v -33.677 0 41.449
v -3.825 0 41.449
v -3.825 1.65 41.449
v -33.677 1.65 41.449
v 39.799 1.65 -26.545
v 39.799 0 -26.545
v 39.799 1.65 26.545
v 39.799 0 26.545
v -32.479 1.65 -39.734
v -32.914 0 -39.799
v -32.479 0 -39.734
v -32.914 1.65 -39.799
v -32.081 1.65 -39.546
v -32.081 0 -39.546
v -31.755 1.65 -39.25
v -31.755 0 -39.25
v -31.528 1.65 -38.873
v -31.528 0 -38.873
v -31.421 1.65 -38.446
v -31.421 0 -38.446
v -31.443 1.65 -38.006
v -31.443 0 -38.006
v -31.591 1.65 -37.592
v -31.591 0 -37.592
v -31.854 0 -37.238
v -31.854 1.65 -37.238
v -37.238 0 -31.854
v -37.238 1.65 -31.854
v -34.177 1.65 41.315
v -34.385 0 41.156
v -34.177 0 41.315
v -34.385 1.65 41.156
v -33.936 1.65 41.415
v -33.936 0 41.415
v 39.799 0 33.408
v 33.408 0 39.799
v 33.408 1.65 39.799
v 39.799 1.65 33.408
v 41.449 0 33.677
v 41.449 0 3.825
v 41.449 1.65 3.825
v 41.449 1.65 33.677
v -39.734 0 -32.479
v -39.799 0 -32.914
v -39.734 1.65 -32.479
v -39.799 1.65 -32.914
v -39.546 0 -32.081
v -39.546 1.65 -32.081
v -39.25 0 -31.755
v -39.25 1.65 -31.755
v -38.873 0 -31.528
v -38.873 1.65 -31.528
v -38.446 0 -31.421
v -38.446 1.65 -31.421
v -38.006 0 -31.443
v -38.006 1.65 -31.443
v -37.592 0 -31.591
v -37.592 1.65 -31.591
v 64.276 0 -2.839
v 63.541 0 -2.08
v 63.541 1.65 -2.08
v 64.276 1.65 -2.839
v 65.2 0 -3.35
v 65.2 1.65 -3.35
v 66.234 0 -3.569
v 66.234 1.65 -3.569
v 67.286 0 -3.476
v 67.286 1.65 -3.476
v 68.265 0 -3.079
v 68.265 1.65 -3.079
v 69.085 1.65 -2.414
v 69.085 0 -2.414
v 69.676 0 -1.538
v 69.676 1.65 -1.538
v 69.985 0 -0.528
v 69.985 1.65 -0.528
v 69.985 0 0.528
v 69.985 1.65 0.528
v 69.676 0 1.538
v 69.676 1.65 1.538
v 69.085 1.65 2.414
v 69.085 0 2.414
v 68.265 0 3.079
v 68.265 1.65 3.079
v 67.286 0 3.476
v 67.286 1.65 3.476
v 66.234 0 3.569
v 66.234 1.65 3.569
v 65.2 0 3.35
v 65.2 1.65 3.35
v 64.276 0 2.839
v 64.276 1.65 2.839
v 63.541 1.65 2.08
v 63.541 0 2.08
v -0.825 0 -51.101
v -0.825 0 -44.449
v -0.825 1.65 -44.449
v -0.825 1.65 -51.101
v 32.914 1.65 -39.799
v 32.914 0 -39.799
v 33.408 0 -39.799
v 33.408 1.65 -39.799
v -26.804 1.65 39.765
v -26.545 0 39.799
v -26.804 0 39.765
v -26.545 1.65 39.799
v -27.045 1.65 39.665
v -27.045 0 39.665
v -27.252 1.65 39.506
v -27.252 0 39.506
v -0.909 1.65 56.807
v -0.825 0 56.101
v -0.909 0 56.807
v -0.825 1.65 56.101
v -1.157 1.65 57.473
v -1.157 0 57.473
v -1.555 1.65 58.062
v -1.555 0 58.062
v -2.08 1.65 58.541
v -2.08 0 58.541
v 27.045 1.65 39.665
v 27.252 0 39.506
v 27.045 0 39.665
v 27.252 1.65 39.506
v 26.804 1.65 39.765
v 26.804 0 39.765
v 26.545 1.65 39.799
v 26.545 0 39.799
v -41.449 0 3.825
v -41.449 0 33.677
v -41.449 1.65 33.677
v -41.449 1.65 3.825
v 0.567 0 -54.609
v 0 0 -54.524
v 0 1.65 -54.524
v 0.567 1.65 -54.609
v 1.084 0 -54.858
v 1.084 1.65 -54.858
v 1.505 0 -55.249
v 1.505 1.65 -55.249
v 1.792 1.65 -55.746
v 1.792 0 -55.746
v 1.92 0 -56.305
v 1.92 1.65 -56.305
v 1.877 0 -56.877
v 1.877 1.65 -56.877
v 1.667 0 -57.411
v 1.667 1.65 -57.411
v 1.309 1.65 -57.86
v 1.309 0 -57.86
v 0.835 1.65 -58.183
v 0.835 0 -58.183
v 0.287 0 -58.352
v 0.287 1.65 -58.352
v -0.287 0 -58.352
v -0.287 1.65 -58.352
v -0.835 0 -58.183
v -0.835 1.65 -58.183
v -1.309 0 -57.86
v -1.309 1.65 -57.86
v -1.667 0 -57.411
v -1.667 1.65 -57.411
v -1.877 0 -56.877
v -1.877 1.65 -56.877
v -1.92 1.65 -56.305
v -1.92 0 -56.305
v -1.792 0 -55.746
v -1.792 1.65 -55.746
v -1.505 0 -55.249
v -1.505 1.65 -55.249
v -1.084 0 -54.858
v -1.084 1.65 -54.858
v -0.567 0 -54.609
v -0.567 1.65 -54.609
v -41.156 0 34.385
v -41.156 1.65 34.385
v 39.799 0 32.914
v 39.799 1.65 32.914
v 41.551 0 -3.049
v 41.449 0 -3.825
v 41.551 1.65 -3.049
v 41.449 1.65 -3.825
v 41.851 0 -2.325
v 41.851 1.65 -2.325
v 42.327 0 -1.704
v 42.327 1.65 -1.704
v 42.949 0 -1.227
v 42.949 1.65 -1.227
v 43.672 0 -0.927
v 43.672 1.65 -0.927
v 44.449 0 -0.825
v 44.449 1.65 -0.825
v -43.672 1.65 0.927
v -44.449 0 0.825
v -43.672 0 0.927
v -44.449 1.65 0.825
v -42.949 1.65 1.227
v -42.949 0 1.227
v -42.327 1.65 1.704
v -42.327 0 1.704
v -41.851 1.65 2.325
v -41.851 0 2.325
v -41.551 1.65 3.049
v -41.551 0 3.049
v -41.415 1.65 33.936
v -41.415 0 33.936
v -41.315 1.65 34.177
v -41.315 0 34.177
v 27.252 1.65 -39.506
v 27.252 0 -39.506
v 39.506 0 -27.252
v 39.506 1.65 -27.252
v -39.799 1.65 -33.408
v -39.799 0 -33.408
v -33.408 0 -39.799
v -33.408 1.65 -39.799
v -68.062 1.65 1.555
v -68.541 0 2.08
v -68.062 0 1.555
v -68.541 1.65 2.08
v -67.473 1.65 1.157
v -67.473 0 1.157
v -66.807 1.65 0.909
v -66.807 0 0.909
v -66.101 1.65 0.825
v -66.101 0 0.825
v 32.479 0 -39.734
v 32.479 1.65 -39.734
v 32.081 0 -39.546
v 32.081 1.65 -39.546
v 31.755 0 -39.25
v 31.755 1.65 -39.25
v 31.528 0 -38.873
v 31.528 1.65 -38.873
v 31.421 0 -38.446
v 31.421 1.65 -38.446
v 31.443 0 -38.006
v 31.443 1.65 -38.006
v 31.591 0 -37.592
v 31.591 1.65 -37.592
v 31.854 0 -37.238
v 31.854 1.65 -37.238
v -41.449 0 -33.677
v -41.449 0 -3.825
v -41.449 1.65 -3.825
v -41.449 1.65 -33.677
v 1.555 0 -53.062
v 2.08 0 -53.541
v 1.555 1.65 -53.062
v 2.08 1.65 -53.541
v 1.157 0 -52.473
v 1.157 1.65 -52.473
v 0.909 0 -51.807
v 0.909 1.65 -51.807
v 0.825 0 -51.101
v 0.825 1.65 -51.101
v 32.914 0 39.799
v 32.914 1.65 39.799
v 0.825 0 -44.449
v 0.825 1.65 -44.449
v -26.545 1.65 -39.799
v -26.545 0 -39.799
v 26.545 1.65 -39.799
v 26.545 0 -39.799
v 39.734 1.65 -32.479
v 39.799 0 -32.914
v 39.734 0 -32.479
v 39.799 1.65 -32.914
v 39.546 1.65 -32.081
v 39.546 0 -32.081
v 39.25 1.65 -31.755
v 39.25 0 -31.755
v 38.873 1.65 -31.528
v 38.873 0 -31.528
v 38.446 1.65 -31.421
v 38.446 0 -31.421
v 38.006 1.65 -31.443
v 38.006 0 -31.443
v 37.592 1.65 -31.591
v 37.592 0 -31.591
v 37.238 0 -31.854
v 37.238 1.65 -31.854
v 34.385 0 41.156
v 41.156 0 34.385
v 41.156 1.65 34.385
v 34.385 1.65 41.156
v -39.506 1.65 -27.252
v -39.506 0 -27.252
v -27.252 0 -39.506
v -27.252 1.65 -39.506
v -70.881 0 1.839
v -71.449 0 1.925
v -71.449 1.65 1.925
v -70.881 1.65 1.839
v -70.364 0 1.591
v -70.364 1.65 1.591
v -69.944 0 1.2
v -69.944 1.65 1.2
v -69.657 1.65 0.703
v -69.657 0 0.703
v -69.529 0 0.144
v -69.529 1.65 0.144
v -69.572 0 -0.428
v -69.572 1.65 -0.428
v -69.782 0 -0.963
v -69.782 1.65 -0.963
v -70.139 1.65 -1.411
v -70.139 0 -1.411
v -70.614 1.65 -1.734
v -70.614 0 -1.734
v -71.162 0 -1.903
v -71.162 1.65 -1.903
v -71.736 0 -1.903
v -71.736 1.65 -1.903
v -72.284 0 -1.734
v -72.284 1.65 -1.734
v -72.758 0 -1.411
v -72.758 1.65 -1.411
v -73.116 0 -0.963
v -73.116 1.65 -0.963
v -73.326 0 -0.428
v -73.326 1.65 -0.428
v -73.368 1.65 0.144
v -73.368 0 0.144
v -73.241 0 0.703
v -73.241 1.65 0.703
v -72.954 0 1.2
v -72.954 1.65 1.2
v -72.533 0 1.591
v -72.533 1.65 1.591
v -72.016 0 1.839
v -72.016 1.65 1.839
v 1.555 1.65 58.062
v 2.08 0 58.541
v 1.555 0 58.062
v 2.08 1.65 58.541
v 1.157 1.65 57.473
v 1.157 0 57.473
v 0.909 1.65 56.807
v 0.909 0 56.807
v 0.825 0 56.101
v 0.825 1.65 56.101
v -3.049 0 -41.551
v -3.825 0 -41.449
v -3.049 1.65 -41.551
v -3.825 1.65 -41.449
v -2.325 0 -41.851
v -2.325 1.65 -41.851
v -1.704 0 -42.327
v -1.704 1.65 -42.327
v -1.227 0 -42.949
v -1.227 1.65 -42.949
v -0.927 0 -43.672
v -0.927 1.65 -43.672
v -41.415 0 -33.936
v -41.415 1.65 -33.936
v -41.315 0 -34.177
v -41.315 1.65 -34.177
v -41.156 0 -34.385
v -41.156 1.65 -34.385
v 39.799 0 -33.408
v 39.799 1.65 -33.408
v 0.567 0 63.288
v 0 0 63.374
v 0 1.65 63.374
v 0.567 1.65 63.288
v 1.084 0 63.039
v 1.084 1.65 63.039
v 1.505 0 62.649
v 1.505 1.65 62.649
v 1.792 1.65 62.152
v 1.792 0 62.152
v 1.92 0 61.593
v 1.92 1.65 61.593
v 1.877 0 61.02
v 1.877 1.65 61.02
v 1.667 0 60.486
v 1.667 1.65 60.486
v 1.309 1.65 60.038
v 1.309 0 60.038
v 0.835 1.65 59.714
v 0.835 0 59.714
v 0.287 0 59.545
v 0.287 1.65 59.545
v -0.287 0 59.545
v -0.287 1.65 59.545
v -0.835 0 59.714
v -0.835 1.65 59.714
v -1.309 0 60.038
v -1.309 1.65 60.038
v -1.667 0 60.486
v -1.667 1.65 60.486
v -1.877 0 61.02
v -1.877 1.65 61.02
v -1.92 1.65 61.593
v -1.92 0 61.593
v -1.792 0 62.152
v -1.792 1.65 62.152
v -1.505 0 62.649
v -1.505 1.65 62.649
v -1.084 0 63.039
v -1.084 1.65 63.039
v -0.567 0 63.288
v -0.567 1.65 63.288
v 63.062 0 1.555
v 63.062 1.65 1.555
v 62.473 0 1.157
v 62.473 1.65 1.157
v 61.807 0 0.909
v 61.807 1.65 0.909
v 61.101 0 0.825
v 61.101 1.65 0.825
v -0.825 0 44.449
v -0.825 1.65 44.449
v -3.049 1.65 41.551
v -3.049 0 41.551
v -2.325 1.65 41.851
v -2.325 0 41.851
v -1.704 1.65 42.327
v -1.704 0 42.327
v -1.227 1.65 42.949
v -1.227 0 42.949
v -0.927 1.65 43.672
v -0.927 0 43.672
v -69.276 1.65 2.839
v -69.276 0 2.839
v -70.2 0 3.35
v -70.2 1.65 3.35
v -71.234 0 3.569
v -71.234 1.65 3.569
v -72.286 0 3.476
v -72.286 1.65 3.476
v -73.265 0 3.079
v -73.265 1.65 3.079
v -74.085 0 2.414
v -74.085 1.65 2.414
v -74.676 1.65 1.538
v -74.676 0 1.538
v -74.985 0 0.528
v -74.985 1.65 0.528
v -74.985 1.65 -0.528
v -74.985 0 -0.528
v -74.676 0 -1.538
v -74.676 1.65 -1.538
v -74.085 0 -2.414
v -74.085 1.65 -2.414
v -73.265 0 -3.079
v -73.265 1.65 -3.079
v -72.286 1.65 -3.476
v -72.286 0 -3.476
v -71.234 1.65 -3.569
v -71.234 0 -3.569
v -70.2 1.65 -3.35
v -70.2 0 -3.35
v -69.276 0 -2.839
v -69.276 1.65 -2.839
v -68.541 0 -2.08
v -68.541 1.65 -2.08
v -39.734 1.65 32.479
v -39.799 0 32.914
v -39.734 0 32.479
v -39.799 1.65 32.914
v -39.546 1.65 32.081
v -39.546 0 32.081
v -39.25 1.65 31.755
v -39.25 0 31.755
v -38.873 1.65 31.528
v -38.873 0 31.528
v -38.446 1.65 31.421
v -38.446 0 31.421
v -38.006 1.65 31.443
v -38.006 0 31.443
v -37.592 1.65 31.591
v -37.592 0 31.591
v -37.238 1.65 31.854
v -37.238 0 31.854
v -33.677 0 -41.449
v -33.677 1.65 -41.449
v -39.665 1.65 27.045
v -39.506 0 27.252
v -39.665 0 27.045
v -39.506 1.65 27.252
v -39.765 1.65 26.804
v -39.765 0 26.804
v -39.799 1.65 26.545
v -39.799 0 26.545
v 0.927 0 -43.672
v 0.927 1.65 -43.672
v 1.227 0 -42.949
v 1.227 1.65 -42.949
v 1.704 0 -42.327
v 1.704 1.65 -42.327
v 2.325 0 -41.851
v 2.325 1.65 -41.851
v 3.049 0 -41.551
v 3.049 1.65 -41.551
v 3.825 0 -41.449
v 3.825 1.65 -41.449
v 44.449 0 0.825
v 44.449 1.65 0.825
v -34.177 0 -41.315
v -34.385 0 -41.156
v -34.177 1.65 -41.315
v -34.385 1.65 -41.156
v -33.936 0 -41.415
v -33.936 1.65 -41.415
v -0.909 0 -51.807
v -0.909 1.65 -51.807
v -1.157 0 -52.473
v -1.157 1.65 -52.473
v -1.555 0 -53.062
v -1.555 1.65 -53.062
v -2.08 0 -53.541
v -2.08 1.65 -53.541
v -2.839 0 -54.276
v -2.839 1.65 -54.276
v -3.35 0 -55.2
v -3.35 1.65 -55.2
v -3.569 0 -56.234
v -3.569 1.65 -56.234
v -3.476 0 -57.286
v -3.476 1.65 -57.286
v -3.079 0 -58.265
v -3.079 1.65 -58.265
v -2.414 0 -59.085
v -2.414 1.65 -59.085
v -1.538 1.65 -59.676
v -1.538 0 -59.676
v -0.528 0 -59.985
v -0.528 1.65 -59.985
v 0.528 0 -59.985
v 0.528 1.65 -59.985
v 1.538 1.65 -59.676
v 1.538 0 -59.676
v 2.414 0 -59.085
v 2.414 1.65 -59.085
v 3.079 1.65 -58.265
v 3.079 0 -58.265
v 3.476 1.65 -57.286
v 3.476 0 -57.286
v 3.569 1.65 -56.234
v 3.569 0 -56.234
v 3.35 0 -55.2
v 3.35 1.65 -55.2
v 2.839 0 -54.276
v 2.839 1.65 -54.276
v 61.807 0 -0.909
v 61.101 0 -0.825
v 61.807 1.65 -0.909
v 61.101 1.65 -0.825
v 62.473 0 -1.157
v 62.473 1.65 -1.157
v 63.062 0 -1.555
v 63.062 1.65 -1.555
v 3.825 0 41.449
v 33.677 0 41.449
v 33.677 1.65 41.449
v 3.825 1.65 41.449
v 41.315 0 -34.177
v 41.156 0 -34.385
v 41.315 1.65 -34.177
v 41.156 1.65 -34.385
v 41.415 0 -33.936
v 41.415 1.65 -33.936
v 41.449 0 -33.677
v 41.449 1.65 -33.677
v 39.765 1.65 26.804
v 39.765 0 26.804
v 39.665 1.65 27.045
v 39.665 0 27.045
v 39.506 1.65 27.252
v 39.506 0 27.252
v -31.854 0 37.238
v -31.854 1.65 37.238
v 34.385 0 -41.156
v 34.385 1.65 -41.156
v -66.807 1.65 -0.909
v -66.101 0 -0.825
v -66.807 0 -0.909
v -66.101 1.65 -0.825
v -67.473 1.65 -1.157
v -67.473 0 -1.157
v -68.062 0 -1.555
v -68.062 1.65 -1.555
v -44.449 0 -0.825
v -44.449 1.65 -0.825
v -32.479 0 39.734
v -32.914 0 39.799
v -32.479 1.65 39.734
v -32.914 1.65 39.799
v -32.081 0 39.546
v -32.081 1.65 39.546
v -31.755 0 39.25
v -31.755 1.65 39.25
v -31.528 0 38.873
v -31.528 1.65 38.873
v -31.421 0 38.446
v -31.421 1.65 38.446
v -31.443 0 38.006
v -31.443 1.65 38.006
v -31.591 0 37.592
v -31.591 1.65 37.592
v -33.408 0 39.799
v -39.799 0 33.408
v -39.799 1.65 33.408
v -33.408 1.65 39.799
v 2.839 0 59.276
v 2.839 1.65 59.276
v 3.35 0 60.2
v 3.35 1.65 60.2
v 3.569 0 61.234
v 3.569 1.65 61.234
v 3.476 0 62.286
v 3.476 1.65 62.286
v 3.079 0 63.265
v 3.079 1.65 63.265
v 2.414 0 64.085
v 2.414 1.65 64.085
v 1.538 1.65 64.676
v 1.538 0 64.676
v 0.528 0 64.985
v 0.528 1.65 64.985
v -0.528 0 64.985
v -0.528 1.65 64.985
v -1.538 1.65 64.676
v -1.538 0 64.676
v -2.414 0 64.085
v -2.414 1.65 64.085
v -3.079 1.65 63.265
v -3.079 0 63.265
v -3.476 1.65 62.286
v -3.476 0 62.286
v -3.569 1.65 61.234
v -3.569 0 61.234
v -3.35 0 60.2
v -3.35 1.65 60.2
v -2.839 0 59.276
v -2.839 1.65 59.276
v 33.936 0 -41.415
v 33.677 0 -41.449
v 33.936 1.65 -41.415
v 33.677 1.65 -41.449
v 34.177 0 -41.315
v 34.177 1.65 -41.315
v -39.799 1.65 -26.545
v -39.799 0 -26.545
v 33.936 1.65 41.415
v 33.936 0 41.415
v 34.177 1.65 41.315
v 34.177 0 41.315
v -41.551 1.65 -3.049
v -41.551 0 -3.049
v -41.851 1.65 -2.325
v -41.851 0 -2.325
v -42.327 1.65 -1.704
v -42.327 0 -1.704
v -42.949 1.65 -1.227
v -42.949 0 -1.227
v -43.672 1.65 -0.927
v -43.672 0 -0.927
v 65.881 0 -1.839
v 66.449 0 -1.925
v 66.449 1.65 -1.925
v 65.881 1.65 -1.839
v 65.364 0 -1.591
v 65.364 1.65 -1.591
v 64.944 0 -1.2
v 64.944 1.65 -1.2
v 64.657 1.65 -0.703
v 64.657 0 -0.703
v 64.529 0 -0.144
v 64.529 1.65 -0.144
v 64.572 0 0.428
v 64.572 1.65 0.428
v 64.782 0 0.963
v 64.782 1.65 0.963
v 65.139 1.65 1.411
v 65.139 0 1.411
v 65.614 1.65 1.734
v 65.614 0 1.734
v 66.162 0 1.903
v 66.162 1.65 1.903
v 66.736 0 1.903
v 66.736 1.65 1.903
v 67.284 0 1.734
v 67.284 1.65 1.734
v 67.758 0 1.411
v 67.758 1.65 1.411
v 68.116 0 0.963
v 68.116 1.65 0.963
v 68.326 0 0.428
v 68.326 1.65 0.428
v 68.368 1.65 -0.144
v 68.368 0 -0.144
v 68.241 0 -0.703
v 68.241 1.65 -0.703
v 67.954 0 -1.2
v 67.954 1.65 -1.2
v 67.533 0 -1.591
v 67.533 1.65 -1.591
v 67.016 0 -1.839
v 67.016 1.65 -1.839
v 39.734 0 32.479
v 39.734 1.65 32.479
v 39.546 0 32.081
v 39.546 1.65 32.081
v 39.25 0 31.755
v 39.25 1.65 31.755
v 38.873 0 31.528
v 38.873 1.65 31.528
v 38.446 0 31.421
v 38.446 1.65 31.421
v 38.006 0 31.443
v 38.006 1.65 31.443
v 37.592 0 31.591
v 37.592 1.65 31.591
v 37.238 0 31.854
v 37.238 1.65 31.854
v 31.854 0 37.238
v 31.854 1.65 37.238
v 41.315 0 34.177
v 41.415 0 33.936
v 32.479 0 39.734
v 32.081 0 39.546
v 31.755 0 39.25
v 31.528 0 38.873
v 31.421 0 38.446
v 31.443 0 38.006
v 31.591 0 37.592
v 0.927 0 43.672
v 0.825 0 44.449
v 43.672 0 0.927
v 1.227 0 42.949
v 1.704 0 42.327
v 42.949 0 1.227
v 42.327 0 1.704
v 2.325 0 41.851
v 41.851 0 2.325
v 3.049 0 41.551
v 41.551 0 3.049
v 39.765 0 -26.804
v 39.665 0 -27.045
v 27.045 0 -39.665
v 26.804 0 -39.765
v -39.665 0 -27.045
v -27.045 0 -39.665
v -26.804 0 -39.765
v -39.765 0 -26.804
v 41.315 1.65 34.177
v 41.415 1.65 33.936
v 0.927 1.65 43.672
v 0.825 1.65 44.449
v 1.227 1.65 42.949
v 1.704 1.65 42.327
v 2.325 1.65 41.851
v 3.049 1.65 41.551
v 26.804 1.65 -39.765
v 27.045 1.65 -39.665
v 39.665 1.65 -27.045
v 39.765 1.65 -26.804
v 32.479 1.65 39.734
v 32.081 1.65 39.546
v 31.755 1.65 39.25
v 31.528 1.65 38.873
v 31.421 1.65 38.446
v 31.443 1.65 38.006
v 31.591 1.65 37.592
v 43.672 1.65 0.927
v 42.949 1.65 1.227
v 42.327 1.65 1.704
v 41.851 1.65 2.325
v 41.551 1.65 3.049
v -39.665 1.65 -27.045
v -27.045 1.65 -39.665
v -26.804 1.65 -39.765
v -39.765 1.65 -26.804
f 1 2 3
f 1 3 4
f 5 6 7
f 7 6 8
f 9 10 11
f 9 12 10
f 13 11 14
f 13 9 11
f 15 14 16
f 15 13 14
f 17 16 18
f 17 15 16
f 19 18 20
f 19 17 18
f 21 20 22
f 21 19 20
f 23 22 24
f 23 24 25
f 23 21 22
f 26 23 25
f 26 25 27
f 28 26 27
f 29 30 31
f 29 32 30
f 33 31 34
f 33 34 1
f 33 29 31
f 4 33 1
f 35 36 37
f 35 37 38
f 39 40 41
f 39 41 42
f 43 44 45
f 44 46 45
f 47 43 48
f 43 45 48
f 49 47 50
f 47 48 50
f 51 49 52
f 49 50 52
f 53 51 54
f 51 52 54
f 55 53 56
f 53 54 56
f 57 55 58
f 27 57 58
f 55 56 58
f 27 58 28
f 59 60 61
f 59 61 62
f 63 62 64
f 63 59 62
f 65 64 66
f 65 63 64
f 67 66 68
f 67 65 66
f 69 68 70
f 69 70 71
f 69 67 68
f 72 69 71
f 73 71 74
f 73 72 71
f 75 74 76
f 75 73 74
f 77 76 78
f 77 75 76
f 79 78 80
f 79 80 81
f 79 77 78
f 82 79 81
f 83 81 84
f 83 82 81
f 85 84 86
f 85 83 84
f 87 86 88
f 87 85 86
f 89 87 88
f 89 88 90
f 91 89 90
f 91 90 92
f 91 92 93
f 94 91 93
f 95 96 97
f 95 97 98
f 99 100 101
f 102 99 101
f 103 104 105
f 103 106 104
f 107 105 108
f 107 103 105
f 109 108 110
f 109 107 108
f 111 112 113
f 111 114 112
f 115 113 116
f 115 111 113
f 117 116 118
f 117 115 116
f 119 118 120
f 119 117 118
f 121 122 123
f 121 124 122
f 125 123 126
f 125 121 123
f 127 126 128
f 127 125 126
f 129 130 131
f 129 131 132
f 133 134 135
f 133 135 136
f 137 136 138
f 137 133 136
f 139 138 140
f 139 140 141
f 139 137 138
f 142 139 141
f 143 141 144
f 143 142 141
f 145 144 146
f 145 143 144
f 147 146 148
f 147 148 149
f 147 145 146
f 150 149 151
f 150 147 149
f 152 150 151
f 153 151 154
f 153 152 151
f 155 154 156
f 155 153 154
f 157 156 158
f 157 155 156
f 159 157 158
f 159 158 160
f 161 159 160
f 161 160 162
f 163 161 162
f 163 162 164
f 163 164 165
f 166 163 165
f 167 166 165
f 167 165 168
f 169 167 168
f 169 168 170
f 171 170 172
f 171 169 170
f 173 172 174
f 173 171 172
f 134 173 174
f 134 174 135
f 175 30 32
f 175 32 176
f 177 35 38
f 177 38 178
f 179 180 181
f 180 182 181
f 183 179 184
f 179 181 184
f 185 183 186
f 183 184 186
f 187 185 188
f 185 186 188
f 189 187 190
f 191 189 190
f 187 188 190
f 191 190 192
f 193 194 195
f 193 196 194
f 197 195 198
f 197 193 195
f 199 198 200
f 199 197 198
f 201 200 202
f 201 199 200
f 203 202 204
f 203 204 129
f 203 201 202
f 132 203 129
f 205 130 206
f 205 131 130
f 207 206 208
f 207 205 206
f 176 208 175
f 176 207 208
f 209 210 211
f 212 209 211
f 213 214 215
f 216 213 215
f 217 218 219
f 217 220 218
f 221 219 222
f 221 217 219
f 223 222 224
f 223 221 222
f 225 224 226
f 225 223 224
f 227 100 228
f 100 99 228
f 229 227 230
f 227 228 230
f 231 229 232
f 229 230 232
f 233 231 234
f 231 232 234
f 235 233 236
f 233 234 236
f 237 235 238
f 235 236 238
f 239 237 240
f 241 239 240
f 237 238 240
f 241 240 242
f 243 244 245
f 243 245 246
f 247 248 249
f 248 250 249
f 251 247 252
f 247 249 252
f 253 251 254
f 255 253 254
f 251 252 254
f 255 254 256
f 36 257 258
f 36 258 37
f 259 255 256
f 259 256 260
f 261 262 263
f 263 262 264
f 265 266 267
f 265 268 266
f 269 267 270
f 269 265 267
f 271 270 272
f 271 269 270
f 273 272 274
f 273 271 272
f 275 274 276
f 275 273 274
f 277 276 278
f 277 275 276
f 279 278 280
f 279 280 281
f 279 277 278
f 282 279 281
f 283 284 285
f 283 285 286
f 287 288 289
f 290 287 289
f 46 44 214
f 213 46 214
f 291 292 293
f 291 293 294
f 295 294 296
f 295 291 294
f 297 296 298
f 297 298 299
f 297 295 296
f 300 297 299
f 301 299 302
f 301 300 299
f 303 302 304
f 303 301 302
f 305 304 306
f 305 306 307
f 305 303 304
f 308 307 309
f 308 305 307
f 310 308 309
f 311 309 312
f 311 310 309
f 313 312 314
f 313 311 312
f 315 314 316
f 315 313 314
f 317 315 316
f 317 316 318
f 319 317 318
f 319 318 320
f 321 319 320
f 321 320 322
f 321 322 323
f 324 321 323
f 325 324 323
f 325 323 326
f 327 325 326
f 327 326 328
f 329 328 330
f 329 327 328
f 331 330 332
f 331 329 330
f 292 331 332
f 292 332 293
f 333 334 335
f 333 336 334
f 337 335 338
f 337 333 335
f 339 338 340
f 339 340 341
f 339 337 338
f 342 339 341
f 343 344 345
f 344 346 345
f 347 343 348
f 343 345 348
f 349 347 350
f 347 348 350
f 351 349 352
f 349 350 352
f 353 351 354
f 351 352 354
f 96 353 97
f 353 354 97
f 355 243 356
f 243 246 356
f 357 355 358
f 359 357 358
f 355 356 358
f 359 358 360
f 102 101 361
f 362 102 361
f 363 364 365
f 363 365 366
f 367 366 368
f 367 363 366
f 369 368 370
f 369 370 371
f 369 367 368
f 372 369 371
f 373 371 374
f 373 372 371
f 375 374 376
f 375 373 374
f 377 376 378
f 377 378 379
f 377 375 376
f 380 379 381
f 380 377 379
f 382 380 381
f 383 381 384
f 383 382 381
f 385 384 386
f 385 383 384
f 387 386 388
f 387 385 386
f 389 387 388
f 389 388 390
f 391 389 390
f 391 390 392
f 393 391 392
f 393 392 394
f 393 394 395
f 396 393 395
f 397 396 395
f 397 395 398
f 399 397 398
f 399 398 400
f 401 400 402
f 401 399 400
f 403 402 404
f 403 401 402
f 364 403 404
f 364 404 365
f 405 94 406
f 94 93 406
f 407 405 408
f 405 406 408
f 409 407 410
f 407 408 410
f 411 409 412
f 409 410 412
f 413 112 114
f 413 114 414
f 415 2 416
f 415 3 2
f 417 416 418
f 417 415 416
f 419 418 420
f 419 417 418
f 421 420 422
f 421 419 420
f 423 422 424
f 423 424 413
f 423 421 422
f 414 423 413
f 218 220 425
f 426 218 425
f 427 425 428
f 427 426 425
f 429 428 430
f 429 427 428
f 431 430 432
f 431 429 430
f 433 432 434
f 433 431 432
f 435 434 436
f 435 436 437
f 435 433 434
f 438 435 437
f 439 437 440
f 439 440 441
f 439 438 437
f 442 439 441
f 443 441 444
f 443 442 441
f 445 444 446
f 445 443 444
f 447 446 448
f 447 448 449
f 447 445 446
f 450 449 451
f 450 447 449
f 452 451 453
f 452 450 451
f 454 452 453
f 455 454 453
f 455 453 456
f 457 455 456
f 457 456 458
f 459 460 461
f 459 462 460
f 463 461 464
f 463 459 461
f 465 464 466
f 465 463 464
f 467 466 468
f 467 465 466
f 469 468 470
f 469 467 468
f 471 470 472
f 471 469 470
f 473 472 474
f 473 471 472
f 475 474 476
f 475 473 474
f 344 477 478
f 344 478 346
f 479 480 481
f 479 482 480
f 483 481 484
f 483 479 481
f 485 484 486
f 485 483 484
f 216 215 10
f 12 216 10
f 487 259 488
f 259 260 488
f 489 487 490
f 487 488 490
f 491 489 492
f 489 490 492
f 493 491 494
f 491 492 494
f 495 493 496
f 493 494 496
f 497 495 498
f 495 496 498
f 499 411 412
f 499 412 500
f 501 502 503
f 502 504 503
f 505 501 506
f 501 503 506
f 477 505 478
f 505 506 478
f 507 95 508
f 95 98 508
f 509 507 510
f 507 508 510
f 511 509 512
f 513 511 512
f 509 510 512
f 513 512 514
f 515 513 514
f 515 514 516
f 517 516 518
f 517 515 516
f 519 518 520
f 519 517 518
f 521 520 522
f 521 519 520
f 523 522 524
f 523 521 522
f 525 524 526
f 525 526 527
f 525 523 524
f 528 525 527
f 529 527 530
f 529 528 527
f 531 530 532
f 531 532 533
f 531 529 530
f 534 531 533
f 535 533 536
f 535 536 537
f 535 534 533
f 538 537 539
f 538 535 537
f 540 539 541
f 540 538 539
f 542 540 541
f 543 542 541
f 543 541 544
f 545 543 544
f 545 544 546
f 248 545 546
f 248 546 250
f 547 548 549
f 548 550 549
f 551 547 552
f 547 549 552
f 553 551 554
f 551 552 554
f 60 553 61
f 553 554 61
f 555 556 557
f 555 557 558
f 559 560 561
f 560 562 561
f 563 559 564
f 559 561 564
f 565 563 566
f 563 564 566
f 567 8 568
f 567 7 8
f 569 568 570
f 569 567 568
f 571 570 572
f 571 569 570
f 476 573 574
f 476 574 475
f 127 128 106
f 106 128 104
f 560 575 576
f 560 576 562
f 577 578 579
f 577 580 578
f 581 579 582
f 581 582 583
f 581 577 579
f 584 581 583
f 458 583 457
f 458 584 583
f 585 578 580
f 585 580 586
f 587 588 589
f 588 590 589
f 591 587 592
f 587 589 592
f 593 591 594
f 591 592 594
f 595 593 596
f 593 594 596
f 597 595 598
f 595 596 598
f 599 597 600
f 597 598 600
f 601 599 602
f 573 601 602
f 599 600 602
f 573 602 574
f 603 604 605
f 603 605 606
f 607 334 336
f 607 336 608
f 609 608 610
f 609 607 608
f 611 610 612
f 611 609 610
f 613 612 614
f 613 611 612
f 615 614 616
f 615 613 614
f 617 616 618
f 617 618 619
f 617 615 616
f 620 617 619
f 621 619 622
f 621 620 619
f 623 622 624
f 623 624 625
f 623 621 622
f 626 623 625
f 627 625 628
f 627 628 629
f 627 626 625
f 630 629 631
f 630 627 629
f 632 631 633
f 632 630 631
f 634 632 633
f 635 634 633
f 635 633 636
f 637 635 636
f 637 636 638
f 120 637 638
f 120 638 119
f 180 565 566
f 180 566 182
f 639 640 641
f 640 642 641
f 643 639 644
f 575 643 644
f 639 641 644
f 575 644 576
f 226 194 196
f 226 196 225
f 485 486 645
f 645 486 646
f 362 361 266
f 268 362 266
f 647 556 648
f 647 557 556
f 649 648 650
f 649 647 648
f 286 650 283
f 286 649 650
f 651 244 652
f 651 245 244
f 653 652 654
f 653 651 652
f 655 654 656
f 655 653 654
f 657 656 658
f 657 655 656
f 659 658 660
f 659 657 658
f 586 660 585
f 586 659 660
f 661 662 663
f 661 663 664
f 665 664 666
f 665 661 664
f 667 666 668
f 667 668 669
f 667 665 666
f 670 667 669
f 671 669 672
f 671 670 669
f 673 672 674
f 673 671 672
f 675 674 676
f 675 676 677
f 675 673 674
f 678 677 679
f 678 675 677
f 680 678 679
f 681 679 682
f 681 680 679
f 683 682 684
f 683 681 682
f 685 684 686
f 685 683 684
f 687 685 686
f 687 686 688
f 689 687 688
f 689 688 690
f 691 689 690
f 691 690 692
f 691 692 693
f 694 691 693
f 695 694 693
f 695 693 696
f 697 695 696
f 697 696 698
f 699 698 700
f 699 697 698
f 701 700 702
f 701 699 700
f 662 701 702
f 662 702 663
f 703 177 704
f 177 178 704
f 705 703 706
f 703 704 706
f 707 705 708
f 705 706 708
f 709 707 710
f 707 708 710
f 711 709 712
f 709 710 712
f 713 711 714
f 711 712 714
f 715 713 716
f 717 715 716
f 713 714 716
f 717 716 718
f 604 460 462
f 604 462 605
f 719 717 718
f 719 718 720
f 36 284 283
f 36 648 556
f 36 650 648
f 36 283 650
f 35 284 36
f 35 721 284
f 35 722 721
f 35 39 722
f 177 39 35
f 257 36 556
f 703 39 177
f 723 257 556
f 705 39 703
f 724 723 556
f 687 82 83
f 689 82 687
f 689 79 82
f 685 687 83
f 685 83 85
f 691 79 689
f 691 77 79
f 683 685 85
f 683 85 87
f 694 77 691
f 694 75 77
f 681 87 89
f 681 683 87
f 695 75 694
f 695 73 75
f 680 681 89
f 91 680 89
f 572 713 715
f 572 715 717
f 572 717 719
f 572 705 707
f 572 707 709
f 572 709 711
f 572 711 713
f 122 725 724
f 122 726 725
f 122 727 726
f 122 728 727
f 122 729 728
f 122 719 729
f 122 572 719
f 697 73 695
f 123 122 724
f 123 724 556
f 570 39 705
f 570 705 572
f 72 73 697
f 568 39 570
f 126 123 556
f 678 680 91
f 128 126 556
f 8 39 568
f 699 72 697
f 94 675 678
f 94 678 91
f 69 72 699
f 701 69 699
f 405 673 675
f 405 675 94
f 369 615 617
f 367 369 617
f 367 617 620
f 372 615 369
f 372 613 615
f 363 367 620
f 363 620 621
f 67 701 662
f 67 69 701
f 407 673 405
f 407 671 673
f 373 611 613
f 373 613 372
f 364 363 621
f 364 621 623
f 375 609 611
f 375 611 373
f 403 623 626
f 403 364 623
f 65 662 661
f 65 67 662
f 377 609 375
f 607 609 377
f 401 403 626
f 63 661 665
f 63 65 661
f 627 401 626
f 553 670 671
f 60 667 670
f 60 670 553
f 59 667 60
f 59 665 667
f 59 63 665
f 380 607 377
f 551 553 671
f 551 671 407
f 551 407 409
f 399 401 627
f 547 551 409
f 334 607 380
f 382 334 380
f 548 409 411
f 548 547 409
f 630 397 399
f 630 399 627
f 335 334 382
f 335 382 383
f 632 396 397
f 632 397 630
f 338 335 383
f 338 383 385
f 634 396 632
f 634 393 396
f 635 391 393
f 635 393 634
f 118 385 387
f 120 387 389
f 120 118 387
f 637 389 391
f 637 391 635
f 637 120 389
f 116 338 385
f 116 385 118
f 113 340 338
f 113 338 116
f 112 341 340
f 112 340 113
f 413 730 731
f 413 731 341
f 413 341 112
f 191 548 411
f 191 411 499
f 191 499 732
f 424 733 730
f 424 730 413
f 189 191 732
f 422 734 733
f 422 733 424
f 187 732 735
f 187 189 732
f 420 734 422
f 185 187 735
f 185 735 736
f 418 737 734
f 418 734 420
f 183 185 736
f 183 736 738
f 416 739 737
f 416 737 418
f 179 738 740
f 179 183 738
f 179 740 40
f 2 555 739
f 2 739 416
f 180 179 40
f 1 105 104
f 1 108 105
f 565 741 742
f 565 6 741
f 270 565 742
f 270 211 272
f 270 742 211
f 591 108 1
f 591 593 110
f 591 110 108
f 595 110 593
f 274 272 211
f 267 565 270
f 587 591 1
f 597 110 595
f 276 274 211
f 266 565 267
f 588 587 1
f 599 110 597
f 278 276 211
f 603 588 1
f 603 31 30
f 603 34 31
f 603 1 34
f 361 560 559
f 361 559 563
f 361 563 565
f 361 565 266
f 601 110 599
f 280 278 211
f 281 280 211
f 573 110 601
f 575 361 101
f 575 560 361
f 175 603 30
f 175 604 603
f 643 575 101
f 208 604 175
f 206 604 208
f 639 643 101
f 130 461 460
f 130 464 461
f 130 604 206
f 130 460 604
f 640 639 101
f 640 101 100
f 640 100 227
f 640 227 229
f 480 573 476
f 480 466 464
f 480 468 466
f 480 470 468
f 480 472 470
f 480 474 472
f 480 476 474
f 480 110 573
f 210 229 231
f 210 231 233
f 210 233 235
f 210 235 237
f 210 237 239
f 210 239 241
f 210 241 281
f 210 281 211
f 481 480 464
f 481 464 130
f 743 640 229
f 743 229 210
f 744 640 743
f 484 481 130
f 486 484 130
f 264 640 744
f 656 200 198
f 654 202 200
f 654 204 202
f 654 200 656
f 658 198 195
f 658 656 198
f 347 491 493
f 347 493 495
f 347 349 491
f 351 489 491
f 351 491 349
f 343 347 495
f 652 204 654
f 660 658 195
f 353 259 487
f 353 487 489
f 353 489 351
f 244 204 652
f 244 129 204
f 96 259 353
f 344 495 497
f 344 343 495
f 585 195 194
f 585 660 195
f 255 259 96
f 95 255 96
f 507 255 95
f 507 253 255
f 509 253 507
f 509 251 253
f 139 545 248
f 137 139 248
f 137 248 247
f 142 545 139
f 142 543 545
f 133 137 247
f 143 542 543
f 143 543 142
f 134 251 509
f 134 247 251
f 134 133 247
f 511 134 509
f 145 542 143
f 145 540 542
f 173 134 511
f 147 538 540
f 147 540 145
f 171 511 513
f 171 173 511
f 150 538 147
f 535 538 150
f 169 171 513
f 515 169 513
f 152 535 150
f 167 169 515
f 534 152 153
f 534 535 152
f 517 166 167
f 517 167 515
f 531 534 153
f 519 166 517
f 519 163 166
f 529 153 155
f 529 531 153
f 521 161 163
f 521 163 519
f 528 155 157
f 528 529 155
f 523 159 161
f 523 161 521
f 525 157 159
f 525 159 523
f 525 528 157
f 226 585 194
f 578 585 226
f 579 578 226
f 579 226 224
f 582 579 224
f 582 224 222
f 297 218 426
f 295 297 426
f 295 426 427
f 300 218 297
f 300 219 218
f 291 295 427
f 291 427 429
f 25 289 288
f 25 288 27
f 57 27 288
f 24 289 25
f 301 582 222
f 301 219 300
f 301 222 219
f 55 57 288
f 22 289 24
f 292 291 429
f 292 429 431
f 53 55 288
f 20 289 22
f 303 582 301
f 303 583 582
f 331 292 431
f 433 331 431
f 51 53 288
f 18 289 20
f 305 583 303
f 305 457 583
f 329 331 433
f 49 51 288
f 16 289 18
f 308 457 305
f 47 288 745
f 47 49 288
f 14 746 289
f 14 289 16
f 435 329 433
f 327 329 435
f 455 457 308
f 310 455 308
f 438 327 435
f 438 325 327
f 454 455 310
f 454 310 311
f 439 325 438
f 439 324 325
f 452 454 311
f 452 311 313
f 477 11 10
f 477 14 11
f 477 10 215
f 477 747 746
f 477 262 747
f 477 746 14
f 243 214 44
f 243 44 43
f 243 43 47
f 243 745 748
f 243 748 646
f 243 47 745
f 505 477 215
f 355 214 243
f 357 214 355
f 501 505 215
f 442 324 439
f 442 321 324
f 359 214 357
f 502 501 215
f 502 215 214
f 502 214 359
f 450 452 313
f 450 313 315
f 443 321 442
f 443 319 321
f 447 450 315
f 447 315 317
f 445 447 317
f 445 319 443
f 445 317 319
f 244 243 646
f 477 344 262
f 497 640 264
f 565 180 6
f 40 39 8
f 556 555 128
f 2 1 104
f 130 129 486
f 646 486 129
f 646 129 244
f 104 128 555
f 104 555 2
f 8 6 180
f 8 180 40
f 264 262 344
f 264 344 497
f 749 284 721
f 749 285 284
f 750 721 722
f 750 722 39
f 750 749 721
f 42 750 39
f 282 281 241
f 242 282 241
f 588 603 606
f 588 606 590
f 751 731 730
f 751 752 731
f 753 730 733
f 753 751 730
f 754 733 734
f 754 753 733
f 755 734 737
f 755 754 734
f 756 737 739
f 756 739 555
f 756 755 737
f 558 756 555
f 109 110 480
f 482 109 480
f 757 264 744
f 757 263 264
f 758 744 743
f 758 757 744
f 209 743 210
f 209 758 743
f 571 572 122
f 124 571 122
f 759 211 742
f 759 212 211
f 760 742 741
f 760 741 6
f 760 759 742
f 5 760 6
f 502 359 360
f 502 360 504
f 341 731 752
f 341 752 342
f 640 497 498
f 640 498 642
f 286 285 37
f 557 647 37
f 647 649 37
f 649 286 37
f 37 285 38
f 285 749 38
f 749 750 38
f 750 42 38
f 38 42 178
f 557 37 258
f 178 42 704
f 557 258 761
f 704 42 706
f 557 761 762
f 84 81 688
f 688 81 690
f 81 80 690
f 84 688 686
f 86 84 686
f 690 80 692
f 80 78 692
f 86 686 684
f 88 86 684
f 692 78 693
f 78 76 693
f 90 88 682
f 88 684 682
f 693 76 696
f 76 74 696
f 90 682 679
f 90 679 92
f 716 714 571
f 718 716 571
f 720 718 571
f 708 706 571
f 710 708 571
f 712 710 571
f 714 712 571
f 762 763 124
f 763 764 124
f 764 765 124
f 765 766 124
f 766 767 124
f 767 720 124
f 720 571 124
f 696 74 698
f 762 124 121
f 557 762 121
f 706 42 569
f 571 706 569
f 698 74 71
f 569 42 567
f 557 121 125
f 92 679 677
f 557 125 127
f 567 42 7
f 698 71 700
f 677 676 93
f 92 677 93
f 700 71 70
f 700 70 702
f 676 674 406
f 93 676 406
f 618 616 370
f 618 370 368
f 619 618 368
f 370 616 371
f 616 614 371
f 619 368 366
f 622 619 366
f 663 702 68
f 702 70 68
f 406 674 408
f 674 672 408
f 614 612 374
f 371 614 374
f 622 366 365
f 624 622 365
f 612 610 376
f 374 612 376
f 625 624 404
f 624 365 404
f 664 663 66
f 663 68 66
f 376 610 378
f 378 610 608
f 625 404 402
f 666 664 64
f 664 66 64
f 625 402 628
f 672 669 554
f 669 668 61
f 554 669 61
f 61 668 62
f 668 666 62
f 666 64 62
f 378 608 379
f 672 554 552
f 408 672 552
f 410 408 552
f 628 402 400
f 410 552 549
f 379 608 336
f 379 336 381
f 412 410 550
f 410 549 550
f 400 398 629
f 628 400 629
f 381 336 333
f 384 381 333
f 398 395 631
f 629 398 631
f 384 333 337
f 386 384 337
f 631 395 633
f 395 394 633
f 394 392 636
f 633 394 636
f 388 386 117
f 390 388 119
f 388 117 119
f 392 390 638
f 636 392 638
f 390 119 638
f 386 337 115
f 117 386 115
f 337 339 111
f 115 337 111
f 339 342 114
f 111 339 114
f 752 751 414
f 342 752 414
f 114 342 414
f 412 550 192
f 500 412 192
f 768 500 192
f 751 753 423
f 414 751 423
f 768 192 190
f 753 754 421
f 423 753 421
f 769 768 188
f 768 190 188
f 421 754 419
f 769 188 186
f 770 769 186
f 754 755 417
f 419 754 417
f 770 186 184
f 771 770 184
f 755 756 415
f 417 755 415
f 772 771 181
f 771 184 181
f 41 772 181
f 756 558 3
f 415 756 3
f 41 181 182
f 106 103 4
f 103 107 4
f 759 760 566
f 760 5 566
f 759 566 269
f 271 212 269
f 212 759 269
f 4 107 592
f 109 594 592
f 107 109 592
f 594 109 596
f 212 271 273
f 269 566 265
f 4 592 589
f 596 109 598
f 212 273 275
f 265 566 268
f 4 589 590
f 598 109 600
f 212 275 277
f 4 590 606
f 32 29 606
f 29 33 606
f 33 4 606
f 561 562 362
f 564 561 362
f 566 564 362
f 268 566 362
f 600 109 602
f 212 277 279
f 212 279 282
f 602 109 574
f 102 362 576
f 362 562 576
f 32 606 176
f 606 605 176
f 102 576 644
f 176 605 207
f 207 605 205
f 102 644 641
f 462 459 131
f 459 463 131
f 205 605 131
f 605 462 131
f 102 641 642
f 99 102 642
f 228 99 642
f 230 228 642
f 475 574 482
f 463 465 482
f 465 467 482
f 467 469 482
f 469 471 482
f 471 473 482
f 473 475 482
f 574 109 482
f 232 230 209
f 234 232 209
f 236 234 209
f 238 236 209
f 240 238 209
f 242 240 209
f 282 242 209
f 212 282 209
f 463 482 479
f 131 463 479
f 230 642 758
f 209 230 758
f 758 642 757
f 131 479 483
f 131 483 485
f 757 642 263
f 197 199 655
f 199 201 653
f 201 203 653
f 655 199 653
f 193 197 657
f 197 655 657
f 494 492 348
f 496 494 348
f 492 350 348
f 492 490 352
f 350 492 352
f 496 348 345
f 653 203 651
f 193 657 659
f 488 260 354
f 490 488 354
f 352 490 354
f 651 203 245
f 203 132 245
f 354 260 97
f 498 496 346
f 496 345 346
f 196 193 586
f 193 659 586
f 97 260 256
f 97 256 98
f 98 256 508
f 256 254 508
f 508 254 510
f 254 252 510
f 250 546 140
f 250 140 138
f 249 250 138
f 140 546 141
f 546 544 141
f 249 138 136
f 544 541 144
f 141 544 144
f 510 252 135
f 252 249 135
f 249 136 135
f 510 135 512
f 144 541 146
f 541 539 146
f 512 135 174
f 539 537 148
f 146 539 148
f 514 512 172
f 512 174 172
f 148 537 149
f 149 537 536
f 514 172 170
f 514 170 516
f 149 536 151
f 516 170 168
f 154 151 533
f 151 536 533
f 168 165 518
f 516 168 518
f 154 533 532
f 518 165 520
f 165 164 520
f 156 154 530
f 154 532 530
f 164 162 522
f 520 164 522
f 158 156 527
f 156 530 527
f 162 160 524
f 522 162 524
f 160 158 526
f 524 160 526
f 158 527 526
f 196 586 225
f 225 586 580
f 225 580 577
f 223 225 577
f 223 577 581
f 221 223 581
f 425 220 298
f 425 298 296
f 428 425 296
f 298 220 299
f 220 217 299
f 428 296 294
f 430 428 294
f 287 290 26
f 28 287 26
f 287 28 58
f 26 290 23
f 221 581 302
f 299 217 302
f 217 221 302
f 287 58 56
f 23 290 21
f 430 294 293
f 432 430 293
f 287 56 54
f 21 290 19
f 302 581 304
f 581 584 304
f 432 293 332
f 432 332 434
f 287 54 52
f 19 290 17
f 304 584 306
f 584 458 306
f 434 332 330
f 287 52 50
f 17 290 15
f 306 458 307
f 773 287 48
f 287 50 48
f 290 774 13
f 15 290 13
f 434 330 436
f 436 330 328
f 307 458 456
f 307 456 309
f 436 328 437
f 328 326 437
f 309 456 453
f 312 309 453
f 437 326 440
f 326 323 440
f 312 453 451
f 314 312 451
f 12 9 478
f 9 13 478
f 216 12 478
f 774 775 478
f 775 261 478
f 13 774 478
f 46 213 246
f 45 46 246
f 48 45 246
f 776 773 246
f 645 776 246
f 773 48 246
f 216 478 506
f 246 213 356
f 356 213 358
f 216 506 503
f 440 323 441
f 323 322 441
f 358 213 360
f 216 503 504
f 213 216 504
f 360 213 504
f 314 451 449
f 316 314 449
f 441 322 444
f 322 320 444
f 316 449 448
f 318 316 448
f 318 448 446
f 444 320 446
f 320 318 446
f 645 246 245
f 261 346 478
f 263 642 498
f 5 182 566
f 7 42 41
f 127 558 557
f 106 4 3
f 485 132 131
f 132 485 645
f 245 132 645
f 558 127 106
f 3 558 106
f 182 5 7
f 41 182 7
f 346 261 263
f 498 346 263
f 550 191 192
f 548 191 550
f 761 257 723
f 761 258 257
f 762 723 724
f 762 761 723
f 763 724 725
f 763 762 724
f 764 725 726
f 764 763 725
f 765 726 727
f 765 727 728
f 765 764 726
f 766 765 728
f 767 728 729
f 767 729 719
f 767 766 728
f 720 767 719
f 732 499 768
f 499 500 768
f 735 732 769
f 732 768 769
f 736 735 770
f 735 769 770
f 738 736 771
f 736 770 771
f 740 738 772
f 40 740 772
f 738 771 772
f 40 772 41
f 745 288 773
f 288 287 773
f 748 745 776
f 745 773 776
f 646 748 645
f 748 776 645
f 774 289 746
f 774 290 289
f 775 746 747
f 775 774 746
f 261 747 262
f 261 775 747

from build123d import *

# Parameters (mm, degrees)
SKETCH1_R           = 1.925
BOSS_EXTRUDE1_DEPTH = 1.65
FILLET4_R           = 3
FILLET3_R           = 1.5
FILLET5_R           = 1


with BuildPart() as part:
    # Sketch1 → Boss-Extrude1 (new body)
    with BuildSketch(Plane(origin=(0, 0, 0), x_dir=(1, 0, 0), z_dir=(0, 1, 0))):
        with BuildLine():
            Line((-41.448800006, 34.091704203), (-34.091704203, 41.448800006))
            Line((-34.091704203, 41.448800006), (-0.825, 41.448800006))
            Line((-0.825, 41.448800006), (-0.825, 52.97029458))
            ThreePointArc((-0.825, 52.97029458), (0, 60.023800006), (0.825, 52.97029458))
            Line((0.825, 52.97029458), (0.825, 41.448800006))
            Line((0.825, 41.448800006), (34.091704203, 41.448800006))
            Line((34.091704203, 41.448800006), (41.448800006, 34.091704203))
            Line((41.448800006, 34.091704203), (41.448800006, 0.825))
            Line((41.448800006, 0.825), (62.97029458, 0.825))
            ThreePointArc((62.97029458, 0.825), (70.023800006, 0), (62.97029458, -0.825))
            Line((62.97029458, -0.825), (41.448800006, -0.825))
            Line((41.448800006, -0.825), (41.448800006, -34.091704203))
            Line((41.448800006, -34.091704203), (34.091704203, -41.448800006))
            Line((34.091704203, -41.448800006), (0.825, -41.448800006))
            Line((0.825, -41.448800006), (0.825, -57.97029458))
            ThreePointArc((0.825, -57.97029458), (0, -65.023800006), (-0.825, -57.97029458))
            Line((-0.825, -57.97029458), (-0.825, -41.448800006))
            Line((-0.825, -41.448800006), (-34.091704203, -41.448800006))
            Line((-34.091704203, -41.448800006), (-41.448800006, -34.091704203))
            Line((-41.448800006, -34.091704203), (-41.448800006, -0.825))
            Line((-41.448800006, -0.825), (-67.97029458, -0.825))
            ThreePointArc((-67.97029458, -0.825), (-75.023800006, 0), (-67.97029458, 0.825))
            Line((-67.97029458, 0.825), (-41.448800006, 0.825))
            Line((-41.448800006, 0.825), (-41.448800006, 34.091704203))
        make_face()
        with Locations(Location((0, 56.448800006, 0), (0, 0, 270))):
            Circle(SKETCH1_R, mode=Mode.SUBTRACT)
        with Locations(Location((66.448800006, 0, 0), (0, 0, 90))):
            Circle(SKETCH1_R, mode=Mode.SUBTRACT)
        with Locations(Location((0, -61.448800006, 0), (0, 0, 270))):
            Circle(SKETCH1_R, mode=Mode.SUBTRACT)
        with Locations(Location((-71.448800006, 0, 0), (0, 0, 270))):
            Circle(SKETCH1_R, mode=Mode.SUBTRACT)
        Polygon((-39.798800006, 33.408251825), (-33.408251825, 39.798800006), (-29.292890359, 39.798800006), (-39.798800006, 29.292890359), align=None, mode=Mode.SUBTRACT)
        Polygon((-33.408251825, -39.798800006), (-29.292890359, -39.798800006), (-39.798800006, -29.292890359), (-39.798800006, -33.408251825), align=None, mode=Mode.SUBTRACT)
        Polygon((39.798800006, -33.408251825), (39.798800006, -29.292890359), (29.292890359, -39.798800006), (33.408251825, -39.798800006), align=None, mode=Mode.SUBTRACT)
        Polygon((33.408251825, 39.798800006), (39.798800006, 33.408251825), (39.798800006, 29.292890359), (29.292890359, 39.798800006), align=None, mode=Mode.SUBTRACT)
        Polygon((-39.798800006, 26.959437981), (-26.959437981, 39.798800006), (26.959437981, 39.798800006), (39.798800006, 26.959437981), (39.798800006, -26.959437981), (26.959437981, -39.798800006), (-26.959437981, -39.798800006), (-39.798800006, -26.959437981), align=None, mode=Mode.SUBTRACT)
    extrude(amount=BOSS_EXTRUDE1_DEPTH)

    # Fillet4
    fillet4_edges = [part.edges().sort_by_distance(p)[0] for p in [
        (-0.825, 0.825, -41.448800006),
        (-0.825, 0.825, -52.97029458),
        (0.825, 0.825, -52.97029458),
        (0.825, 0.825, -41.448800006),
        (41.448800006, 0.825, -0.825),
        (62.97029458, 0.825, -0.825),
        (62.97029458, 0.825, 0.825),
        (41.448800006, 0.825, 0.825),
        (0.825, 0.825, 41.448800006),
        (0.825, 0.825, 57.97029458),
        (-0.825, 0.825, 57.97029458),
        (-0.825, 0.825, 41.448800006),
        (-41.448800006, 0.825, 0.825),
        (-67.97029458, 0.825, 0.825),
        (-67.97029458, 0.825, -0.825),
        (-41.448800006, 0.825, -0.825),
    ]]
    fillet(fillet4_edges, radius=FILLET4_R)

    # Fillet3
    fillet3_edges = [part.edges().sort_by_distance(p)[0] for p in [
        (-29.292890359, 0.825, 39.798800006),
        (-39.798800006, 0.825, 29.292890359),
        (-39.798800006, 0.825, -29.292890359),
        (-29.292890359, 0.825, -39.798800006),
        (29.292890359, 0.825, -39.798800006),
        (39.798800006, 0.825, -29.292890359),
        (39.798800006, 0.825, 29.292890359),
        (29.292890359, 0.825, 39.798800006),
    ]]
    fillet(fillet3_edges, radius=FILLET3_R)

    # Fillet5
    fillet5_edges = [part.edges().sort_by_distance(p)[0] for p in [
        (-39.798800006, 0.825, -26.959437981),
        (-39.798800006, 0.825, 26.959437981),
        (-26.959437981, 0.825, 39.798800006),
        (26.959437981, 0.825, 39.798800006),
        (39.798800006, 0.825, 26.959437981),
        (39.798800006, 0.825, -26.959437981),
        (26.959437981, 0.825, -39.798800006),
        (-26.959437981, 0.825, -39.798800006),
        (-41.448800006, 0.825, -34.091704203),
        (-34.091704203, 0.825, -41.448800006),
        (34.091704203, 0.825, -41.448800006),
        (41.448800006, 0.825, -34.091704203),
        (41.448800006, 0.825, 34.091704203),
        (34.091704203, 0.825, 41.448800006),
        (-34.091704203, 0.825, 41.448800006),
        (-41.448800006, 0.825, 34.091704203),
    ]]
    fillet(fillet5_edges, radius=FILLET5_R)


solid = part.part
